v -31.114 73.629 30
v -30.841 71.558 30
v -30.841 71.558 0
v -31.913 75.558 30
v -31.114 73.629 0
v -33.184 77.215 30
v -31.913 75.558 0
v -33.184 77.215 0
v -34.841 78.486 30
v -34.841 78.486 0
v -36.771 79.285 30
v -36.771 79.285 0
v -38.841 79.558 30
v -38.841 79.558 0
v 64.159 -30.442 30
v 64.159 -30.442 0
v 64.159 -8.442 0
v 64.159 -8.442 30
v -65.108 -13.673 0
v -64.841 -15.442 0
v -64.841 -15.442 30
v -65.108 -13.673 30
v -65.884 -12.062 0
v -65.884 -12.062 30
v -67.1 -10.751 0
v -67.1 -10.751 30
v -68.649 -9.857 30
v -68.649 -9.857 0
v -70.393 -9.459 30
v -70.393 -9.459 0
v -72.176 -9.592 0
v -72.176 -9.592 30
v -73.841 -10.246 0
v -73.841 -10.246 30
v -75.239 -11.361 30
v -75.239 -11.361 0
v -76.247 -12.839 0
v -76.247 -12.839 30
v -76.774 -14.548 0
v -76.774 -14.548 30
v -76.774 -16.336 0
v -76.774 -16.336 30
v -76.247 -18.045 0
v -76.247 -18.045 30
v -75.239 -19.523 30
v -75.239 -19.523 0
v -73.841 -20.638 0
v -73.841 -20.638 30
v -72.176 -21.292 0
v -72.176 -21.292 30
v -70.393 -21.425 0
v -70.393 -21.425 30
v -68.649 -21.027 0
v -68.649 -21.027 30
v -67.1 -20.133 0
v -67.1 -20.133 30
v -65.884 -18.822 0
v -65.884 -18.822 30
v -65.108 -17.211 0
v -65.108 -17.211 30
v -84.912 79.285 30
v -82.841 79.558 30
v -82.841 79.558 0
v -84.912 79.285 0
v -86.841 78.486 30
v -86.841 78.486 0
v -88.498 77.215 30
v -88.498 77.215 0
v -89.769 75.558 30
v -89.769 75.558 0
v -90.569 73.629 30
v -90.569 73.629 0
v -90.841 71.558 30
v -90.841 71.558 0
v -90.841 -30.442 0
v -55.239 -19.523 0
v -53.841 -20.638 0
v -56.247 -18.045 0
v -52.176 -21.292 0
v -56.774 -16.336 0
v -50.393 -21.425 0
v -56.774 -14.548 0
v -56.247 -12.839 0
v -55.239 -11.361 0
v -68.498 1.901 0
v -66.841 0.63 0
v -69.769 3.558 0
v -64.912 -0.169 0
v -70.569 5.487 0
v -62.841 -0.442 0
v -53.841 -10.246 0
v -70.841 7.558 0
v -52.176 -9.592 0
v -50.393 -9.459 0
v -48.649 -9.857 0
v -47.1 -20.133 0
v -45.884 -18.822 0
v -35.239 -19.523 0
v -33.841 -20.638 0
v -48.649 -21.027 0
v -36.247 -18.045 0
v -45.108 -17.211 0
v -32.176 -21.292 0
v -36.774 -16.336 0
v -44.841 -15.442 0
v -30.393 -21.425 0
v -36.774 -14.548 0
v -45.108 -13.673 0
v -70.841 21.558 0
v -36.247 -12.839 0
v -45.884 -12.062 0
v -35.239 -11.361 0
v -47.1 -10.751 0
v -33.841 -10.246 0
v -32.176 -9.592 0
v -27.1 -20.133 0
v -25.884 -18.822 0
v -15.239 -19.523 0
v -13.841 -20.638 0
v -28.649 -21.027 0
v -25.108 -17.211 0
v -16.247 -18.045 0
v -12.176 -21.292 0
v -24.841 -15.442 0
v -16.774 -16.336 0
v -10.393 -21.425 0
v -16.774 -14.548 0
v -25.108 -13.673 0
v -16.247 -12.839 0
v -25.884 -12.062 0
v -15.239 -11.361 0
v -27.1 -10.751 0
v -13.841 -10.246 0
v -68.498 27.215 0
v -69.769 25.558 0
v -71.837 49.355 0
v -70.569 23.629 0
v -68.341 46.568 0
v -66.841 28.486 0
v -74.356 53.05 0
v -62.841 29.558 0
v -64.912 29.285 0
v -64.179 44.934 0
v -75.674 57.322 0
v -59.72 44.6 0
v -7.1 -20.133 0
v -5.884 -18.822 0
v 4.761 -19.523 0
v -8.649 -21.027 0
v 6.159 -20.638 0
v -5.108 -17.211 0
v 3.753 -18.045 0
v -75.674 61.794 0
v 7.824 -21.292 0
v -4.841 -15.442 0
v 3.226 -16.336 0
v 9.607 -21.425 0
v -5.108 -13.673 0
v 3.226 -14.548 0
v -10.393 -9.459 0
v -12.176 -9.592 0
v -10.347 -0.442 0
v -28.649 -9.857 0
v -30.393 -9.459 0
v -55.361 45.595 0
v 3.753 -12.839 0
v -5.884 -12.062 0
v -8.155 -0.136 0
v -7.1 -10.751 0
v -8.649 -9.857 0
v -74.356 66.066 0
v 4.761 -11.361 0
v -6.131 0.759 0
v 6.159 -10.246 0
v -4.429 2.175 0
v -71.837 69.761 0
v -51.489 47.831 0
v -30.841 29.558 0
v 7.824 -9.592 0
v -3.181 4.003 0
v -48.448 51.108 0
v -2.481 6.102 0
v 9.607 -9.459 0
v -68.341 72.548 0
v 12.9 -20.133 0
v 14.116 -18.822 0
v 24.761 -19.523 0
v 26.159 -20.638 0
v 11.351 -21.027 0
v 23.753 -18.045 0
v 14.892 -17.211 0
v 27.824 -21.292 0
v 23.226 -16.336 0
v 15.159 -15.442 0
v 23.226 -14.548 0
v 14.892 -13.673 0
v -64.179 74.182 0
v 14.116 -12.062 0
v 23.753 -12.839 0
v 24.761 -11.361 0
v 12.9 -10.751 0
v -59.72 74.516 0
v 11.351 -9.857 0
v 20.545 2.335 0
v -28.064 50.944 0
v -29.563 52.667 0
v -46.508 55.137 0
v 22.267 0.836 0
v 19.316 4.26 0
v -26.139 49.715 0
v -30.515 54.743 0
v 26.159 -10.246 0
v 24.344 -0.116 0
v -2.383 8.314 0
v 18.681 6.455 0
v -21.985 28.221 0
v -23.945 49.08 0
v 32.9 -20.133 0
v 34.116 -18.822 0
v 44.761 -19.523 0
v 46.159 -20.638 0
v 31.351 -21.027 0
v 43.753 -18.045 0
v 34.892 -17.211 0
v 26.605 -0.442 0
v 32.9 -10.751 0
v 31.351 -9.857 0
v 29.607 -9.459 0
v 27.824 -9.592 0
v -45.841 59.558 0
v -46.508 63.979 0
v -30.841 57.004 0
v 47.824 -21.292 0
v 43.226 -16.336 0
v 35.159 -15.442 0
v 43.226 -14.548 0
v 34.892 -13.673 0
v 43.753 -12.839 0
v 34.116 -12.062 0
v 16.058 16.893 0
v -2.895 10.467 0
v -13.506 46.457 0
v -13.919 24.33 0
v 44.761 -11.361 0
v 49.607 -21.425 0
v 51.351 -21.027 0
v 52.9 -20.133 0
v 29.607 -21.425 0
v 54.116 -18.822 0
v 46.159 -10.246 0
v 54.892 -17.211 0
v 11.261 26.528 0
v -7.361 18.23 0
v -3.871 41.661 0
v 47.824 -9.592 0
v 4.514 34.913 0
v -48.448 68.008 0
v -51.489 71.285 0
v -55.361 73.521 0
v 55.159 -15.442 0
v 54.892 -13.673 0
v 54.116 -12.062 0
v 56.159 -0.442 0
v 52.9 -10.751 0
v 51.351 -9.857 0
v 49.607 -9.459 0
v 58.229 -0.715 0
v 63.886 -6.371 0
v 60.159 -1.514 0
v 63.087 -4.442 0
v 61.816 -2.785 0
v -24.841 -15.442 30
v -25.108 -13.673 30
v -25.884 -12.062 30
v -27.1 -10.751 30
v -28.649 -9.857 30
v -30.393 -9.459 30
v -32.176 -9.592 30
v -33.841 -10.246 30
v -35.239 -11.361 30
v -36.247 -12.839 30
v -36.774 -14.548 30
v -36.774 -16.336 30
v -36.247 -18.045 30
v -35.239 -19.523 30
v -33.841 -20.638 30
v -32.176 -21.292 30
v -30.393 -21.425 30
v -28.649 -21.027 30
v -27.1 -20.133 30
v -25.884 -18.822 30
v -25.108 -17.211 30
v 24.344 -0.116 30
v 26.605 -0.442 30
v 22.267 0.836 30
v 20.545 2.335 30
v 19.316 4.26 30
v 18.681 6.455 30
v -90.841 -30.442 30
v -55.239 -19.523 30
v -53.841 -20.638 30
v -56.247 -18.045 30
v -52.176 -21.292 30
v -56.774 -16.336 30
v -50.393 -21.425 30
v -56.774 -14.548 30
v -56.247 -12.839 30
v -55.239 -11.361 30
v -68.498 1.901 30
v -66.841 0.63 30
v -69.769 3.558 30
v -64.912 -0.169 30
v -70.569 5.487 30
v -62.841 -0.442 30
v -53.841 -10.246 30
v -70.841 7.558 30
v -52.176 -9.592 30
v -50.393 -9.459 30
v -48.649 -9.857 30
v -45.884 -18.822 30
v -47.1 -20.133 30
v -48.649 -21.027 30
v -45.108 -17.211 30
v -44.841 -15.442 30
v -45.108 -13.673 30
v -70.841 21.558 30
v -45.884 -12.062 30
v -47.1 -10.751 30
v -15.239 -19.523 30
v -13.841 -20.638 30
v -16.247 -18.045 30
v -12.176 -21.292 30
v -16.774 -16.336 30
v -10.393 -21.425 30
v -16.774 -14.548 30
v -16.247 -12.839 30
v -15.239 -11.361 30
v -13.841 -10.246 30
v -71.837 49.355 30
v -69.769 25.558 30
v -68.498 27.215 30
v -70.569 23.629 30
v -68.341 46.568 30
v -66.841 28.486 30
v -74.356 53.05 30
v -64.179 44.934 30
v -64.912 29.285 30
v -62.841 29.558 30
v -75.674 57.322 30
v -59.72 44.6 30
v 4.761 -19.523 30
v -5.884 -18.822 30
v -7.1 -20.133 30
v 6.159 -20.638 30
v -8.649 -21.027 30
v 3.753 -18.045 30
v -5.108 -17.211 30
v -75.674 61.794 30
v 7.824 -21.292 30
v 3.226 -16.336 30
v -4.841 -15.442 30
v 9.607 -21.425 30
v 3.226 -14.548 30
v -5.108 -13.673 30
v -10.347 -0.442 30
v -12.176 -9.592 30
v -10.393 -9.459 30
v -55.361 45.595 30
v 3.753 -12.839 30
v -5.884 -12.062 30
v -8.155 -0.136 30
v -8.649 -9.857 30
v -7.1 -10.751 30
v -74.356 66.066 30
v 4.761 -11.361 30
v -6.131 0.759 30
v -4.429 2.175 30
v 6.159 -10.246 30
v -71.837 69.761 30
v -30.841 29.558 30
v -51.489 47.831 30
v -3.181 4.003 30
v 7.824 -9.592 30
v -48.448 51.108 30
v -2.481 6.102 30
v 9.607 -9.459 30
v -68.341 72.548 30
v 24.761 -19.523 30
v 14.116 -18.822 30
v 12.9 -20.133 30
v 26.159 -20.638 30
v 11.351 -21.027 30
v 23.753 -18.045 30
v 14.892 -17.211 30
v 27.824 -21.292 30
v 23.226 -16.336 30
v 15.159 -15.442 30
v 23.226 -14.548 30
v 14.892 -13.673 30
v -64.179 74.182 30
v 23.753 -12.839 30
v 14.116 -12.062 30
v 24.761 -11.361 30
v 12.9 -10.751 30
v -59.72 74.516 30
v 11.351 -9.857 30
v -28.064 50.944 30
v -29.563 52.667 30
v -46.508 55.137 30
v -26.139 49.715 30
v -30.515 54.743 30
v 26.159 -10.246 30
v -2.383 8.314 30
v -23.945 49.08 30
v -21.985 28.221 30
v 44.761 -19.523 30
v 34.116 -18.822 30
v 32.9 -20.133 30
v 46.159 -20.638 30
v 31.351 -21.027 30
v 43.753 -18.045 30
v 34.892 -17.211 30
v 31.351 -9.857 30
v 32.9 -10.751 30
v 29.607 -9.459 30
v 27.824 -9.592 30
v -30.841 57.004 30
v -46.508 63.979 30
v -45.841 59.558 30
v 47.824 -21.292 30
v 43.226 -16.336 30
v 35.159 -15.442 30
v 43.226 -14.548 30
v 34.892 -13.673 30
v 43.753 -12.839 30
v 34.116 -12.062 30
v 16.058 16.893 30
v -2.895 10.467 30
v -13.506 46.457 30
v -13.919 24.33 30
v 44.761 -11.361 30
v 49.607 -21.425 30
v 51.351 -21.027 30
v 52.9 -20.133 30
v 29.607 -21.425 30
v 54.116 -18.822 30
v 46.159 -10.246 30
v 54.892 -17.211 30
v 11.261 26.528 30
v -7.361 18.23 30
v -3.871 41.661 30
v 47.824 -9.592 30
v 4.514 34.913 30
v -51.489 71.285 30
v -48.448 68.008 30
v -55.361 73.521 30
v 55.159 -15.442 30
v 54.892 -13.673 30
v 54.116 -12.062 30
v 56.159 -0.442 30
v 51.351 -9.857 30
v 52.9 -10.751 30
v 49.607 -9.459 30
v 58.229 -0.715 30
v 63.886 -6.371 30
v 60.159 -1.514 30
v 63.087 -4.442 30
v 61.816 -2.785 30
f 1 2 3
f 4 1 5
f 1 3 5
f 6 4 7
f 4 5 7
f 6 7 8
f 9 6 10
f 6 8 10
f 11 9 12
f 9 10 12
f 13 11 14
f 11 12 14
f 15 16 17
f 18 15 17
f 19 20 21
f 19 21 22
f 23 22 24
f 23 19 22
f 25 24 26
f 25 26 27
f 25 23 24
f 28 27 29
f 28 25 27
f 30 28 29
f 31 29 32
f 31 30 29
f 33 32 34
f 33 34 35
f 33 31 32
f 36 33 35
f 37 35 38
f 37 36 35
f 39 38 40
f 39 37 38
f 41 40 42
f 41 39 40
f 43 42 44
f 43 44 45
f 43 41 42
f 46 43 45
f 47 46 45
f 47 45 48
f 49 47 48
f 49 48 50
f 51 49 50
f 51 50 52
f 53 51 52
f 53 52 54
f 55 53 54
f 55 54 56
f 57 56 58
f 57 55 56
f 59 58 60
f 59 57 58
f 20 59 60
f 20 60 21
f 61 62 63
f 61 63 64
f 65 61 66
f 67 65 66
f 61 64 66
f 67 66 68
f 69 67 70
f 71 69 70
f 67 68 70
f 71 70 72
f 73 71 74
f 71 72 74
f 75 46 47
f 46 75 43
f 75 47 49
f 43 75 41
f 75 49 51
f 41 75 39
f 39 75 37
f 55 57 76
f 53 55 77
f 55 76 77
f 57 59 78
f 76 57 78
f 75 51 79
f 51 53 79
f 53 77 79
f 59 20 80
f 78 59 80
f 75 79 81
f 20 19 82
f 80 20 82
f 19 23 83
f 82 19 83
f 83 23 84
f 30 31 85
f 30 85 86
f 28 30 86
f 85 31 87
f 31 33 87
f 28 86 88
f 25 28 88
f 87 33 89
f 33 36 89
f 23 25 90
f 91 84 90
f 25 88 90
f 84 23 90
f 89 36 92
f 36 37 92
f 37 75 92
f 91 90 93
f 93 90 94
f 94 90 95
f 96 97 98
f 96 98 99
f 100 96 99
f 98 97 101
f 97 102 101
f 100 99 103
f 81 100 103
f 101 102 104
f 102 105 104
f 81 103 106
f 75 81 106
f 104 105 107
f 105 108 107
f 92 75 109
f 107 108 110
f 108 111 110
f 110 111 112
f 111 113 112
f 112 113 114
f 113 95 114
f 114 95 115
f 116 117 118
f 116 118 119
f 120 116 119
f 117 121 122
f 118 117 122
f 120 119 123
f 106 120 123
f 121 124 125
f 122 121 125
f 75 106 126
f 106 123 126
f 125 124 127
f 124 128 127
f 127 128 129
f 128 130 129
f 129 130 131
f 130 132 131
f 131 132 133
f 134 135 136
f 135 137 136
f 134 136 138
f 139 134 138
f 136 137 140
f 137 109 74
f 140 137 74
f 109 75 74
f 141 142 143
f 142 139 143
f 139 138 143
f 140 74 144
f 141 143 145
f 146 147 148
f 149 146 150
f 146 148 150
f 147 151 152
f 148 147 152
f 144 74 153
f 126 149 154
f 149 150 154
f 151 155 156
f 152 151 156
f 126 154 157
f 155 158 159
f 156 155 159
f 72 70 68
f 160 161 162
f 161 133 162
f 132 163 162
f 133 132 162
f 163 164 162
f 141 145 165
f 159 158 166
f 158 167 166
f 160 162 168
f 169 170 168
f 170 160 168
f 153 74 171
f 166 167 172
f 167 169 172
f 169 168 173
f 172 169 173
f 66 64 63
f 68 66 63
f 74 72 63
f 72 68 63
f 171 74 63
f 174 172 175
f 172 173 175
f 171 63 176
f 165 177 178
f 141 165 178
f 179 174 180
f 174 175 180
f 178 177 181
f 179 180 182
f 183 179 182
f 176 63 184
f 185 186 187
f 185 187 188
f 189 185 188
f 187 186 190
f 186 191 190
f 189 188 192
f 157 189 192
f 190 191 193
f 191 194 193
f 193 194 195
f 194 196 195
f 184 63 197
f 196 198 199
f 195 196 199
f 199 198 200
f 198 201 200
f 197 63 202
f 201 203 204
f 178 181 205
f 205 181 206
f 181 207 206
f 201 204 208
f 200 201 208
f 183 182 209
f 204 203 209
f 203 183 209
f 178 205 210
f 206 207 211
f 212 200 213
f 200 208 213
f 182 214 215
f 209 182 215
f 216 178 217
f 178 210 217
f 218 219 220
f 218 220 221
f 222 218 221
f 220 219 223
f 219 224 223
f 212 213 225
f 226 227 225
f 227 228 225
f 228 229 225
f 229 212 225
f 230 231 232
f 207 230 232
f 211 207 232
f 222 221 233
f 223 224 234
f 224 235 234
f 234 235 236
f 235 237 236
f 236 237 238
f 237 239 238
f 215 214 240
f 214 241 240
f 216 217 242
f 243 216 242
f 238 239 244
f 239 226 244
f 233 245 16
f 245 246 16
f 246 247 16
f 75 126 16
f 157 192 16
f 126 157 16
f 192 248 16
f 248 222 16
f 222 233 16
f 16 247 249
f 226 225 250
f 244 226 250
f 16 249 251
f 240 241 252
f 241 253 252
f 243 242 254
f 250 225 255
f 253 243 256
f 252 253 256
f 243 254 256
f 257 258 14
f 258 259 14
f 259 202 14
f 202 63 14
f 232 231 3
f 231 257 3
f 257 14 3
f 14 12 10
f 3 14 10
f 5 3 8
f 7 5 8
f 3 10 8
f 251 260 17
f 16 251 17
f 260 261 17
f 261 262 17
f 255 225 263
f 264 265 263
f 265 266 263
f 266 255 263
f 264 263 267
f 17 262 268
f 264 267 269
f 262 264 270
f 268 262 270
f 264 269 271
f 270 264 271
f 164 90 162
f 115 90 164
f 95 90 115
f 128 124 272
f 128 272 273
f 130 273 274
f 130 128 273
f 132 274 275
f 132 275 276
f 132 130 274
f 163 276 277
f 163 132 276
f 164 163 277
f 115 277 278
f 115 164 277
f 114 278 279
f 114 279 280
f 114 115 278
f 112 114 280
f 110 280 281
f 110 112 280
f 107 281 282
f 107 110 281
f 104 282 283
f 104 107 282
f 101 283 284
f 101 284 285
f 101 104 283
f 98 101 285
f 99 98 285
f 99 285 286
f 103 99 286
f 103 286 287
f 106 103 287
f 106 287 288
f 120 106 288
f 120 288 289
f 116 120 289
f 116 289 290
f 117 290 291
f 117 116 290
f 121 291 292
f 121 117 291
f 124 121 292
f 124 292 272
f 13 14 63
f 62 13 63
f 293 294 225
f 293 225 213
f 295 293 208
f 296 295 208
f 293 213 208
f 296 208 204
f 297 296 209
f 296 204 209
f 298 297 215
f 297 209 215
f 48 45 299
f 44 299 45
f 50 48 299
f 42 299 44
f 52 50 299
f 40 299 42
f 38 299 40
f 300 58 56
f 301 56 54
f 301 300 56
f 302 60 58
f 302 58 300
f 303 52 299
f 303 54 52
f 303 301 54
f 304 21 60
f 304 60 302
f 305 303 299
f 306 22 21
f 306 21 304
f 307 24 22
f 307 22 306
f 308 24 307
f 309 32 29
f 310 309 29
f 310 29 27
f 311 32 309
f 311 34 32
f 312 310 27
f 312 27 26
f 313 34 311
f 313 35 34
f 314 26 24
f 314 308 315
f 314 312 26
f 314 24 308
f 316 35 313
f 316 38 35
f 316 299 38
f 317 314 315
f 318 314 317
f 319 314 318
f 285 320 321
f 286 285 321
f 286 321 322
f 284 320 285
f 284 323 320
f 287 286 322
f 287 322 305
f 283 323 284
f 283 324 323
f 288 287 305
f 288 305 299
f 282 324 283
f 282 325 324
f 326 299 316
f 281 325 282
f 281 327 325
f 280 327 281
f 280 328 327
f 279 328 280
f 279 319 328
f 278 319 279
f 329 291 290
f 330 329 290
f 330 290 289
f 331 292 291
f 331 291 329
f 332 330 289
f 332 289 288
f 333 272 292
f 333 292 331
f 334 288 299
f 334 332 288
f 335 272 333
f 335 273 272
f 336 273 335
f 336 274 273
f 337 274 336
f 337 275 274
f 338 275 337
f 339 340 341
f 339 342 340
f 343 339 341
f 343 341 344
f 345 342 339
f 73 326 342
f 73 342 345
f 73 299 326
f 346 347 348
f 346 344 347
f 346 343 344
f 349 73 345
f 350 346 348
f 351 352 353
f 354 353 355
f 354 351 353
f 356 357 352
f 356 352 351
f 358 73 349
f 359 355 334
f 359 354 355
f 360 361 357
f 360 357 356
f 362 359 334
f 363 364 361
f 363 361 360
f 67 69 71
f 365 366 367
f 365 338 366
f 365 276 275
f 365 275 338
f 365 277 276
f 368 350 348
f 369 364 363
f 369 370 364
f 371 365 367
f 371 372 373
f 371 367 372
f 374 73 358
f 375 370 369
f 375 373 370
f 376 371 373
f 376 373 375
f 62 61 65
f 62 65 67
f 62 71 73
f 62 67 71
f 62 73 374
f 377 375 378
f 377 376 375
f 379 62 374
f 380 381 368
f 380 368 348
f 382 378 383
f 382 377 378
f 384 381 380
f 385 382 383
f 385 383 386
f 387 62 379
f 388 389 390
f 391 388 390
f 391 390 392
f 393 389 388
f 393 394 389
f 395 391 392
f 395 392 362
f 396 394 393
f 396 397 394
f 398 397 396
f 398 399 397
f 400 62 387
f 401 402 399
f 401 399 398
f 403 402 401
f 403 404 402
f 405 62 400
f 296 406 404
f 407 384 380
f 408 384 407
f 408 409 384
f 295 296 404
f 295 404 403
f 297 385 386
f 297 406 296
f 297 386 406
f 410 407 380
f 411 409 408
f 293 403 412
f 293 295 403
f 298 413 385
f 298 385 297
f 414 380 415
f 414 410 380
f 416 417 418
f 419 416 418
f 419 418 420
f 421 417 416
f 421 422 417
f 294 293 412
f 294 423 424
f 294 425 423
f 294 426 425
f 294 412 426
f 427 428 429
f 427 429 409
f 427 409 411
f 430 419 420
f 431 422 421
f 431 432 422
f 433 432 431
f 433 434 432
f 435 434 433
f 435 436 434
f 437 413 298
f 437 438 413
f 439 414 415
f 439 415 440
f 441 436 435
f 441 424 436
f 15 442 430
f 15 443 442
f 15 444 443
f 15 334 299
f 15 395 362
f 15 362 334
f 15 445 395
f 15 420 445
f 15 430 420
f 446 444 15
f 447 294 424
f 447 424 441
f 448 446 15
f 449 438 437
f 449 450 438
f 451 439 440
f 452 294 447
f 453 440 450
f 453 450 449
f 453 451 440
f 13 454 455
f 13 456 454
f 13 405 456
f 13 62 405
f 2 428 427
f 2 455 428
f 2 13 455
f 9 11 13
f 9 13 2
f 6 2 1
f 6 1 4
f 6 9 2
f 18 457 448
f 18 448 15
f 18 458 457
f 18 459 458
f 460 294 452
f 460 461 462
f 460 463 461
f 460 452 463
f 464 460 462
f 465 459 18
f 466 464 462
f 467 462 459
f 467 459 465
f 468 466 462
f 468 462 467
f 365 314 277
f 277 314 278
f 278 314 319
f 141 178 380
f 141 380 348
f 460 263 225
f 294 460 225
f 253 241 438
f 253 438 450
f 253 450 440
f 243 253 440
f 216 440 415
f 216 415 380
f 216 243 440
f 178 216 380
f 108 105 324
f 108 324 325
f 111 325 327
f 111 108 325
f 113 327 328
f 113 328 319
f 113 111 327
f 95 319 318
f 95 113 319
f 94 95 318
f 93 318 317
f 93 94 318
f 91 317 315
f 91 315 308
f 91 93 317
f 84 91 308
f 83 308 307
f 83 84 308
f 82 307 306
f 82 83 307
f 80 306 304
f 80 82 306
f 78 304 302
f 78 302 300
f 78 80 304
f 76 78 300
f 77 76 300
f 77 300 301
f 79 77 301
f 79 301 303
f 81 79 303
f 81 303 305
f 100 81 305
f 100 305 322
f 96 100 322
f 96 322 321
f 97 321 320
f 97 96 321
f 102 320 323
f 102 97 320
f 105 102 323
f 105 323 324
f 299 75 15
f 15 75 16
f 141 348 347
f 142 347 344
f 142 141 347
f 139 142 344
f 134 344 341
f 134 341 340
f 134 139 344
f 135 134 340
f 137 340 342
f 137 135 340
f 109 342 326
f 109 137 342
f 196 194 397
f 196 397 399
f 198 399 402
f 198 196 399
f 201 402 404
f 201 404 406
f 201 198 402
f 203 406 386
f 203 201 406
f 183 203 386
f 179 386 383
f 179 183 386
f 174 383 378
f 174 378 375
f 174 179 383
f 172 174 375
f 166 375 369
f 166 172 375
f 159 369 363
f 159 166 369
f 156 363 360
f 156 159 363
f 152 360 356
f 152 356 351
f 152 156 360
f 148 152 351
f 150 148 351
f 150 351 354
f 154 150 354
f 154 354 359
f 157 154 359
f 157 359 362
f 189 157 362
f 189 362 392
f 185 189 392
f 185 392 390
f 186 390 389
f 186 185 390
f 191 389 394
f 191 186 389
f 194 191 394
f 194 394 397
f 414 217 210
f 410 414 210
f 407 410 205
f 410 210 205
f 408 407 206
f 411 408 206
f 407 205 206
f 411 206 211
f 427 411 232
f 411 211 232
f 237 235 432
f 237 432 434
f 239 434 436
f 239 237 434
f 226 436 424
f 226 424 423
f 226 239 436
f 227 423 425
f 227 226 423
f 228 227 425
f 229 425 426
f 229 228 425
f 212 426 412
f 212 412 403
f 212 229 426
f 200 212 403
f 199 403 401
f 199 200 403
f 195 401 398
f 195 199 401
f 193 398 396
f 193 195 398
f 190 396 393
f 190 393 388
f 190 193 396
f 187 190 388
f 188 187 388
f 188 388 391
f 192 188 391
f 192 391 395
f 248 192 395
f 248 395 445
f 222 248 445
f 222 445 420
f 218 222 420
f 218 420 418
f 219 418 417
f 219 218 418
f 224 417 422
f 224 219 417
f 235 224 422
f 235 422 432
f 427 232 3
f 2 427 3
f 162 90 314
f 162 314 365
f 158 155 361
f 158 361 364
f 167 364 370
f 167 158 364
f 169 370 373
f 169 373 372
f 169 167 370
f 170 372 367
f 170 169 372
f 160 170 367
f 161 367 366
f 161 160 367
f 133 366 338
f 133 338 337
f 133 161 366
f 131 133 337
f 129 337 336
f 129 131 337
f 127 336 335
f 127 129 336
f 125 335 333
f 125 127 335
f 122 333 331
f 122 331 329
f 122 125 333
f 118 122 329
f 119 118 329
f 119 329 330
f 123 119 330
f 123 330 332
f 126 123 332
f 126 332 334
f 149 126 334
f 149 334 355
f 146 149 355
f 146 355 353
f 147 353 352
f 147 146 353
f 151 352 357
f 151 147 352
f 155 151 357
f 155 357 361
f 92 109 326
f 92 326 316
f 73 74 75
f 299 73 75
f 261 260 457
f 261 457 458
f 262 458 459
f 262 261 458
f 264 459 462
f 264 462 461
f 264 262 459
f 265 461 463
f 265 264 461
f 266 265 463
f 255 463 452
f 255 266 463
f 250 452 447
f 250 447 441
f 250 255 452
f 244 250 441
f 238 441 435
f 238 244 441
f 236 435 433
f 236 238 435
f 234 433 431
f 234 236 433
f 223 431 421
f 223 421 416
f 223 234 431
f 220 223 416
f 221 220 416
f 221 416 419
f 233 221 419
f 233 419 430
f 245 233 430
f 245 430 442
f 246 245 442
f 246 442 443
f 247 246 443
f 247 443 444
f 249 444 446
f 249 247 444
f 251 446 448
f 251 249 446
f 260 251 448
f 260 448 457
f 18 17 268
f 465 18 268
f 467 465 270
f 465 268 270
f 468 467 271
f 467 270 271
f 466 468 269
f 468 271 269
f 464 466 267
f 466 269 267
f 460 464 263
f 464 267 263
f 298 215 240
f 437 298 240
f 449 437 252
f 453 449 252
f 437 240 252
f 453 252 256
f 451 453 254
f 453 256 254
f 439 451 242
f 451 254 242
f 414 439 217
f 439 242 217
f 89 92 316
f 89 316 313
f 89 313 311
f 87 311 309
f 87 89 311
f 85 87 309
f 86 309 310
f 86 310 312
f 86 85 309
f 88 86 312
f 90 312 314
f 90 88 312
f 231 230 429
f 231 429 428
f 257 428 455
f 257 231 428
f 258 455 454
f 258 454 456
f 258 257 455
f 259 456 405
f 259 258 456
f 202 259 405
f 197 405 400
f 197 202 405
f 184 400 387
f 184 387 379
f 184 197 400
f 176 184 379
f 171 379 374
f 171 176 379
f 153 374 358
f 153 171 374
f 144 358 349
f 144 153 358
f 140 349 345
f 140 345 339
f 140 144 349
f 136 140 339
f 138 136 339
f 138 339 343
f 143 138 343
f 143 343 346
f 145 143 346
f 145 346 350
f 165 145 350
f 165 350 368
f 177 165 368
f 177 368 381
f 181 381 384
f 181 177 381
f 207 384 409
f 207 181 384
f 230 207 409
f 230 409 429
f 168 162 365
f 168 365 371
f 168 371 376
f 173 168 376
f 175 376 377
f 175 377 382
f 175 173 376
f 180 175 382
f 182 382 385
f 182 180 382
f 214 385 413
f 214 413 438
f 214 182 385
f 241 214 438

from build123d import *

# Parameters (mm, degrees)
SKETCH2_R           = 6
SKETCH2_R_2         = 15
BOSS_EXTRUDE1_DEPTH = 30


with BuildPart() as part:
    # Sketch2 → Boss-Extrude1 (new body)
    with BuildSketch(Plane.XY):
        with BuildLine():
            Line((-90.841121495, 71.557977192), (-90.841121495, -30.442022808))
            Line((-90.841121495, -30.442022808), (64.158878505, -30.442022808))
            Line((64.158878505, -30.442022808), (64.158878505, -8.442022808))
            ThreePointArc((64.158878505, -8.442022808), (61.815732754, -2.785168558), (56.158878505, -0.442022808))
            Line((56.158878505, -0.442022808), (26.60450497, -0.442022808))
            ThreePointArc((26.60450497, -0.442022808), (21.352247656, 1.523592956), (18.680970285, 6.454528916))
            ThreePointArc((18.680970285, 6.454528916), (4.514217564, 34.913316251), (-23.944569771, 49.080068973))
            ThreePointArc((-23.944569771, 49.080068973), (-28.875505731, 51.751346343), (-30.841121495, 57.003603657))
            Line((-30.841121495, 57.003603657), (-30.841121495, 71.557977192))
            ThreePointArc((-30.841121495, 71.557977192), (-33.184267246, 77.214831442), (-38.841121495, 79.557977192))
            Line((-38.841121495, 79.557977192), (-82.841121495, 79.557977192))
            ThreePointArc((-82.841121495, 79.557977192), (-88.497975745, 77.214831442), (-90.841121495, 71.557977192))
        make_face()
        with Locations((-70.841121495, -15.442022808)):
            Circle(SKETCH2_R, mode=Mode.SUBTRACT)
        with Locations((-50.841121495, -15.442022808)):
            Circle(SKETCH2_R, mode=Mode.SUBTRACT)
        with Locations((-30.841121495, -15.442022808)):
            Circle(SKETCH2_R, mode=Mode.SUBTRACT)
        with Locations((-10.841121495, -15.442022808)):
            Circle(SKETCH2_R, mode=Mode.SUBTRACT)
        with Locations((9.158878505, -15.442022808)):
            Circle(SKETCH2_R, mode=Mode.SUBTRACT)
        with Locations((29.158878505, -15.442022808)):
            Circle(SKETCH2_R, mode=Mode.SUBTRACT)
        with Locations((49.158878505, -15.442022808)):
            Circle(SKETCH2_R, mode=Mode.SUBTRACT)
        with Locations((-60.841121495, 59.557977192)):
            Circle(SKETCH2_R_2, mode=Mode.SUBTRACT)
        with BuildLine():
            Line((-62.841121495, -0.442022808), (-10.347219963, -0.442022808))
            ThreePointArc((-10.347219963, -0.442022808), (-3.741437373, 3.045368594), (-2.894892134, 10.467068101))
            ThreePointArc((-2.894892134, 10.467068101), (-13.918839251, 24.329661907), (-30.841121495, 29.557977192))
            Line((-30.841121495, 29.557977192), (-62.841121495, 29.557977192))
            ThreePointArc((-62.841121495, 29.557977192), (-68.497975745, 27.214831442), (-70.841121495, 21.557977192))
            Line((-70.841121495, 21.557977192), (-70.841121495, 7.557977192))
            ThreePointArc((-70.841121495, 7.557977192), (-68.497975745, 1.901122943), (-62.841121495, -0.442022808))
        make_face(mode=Mode.SUBTRACT)
    extrude(amount=BOSS_EXTRUDE1_DEPTH)


solid = part.part
